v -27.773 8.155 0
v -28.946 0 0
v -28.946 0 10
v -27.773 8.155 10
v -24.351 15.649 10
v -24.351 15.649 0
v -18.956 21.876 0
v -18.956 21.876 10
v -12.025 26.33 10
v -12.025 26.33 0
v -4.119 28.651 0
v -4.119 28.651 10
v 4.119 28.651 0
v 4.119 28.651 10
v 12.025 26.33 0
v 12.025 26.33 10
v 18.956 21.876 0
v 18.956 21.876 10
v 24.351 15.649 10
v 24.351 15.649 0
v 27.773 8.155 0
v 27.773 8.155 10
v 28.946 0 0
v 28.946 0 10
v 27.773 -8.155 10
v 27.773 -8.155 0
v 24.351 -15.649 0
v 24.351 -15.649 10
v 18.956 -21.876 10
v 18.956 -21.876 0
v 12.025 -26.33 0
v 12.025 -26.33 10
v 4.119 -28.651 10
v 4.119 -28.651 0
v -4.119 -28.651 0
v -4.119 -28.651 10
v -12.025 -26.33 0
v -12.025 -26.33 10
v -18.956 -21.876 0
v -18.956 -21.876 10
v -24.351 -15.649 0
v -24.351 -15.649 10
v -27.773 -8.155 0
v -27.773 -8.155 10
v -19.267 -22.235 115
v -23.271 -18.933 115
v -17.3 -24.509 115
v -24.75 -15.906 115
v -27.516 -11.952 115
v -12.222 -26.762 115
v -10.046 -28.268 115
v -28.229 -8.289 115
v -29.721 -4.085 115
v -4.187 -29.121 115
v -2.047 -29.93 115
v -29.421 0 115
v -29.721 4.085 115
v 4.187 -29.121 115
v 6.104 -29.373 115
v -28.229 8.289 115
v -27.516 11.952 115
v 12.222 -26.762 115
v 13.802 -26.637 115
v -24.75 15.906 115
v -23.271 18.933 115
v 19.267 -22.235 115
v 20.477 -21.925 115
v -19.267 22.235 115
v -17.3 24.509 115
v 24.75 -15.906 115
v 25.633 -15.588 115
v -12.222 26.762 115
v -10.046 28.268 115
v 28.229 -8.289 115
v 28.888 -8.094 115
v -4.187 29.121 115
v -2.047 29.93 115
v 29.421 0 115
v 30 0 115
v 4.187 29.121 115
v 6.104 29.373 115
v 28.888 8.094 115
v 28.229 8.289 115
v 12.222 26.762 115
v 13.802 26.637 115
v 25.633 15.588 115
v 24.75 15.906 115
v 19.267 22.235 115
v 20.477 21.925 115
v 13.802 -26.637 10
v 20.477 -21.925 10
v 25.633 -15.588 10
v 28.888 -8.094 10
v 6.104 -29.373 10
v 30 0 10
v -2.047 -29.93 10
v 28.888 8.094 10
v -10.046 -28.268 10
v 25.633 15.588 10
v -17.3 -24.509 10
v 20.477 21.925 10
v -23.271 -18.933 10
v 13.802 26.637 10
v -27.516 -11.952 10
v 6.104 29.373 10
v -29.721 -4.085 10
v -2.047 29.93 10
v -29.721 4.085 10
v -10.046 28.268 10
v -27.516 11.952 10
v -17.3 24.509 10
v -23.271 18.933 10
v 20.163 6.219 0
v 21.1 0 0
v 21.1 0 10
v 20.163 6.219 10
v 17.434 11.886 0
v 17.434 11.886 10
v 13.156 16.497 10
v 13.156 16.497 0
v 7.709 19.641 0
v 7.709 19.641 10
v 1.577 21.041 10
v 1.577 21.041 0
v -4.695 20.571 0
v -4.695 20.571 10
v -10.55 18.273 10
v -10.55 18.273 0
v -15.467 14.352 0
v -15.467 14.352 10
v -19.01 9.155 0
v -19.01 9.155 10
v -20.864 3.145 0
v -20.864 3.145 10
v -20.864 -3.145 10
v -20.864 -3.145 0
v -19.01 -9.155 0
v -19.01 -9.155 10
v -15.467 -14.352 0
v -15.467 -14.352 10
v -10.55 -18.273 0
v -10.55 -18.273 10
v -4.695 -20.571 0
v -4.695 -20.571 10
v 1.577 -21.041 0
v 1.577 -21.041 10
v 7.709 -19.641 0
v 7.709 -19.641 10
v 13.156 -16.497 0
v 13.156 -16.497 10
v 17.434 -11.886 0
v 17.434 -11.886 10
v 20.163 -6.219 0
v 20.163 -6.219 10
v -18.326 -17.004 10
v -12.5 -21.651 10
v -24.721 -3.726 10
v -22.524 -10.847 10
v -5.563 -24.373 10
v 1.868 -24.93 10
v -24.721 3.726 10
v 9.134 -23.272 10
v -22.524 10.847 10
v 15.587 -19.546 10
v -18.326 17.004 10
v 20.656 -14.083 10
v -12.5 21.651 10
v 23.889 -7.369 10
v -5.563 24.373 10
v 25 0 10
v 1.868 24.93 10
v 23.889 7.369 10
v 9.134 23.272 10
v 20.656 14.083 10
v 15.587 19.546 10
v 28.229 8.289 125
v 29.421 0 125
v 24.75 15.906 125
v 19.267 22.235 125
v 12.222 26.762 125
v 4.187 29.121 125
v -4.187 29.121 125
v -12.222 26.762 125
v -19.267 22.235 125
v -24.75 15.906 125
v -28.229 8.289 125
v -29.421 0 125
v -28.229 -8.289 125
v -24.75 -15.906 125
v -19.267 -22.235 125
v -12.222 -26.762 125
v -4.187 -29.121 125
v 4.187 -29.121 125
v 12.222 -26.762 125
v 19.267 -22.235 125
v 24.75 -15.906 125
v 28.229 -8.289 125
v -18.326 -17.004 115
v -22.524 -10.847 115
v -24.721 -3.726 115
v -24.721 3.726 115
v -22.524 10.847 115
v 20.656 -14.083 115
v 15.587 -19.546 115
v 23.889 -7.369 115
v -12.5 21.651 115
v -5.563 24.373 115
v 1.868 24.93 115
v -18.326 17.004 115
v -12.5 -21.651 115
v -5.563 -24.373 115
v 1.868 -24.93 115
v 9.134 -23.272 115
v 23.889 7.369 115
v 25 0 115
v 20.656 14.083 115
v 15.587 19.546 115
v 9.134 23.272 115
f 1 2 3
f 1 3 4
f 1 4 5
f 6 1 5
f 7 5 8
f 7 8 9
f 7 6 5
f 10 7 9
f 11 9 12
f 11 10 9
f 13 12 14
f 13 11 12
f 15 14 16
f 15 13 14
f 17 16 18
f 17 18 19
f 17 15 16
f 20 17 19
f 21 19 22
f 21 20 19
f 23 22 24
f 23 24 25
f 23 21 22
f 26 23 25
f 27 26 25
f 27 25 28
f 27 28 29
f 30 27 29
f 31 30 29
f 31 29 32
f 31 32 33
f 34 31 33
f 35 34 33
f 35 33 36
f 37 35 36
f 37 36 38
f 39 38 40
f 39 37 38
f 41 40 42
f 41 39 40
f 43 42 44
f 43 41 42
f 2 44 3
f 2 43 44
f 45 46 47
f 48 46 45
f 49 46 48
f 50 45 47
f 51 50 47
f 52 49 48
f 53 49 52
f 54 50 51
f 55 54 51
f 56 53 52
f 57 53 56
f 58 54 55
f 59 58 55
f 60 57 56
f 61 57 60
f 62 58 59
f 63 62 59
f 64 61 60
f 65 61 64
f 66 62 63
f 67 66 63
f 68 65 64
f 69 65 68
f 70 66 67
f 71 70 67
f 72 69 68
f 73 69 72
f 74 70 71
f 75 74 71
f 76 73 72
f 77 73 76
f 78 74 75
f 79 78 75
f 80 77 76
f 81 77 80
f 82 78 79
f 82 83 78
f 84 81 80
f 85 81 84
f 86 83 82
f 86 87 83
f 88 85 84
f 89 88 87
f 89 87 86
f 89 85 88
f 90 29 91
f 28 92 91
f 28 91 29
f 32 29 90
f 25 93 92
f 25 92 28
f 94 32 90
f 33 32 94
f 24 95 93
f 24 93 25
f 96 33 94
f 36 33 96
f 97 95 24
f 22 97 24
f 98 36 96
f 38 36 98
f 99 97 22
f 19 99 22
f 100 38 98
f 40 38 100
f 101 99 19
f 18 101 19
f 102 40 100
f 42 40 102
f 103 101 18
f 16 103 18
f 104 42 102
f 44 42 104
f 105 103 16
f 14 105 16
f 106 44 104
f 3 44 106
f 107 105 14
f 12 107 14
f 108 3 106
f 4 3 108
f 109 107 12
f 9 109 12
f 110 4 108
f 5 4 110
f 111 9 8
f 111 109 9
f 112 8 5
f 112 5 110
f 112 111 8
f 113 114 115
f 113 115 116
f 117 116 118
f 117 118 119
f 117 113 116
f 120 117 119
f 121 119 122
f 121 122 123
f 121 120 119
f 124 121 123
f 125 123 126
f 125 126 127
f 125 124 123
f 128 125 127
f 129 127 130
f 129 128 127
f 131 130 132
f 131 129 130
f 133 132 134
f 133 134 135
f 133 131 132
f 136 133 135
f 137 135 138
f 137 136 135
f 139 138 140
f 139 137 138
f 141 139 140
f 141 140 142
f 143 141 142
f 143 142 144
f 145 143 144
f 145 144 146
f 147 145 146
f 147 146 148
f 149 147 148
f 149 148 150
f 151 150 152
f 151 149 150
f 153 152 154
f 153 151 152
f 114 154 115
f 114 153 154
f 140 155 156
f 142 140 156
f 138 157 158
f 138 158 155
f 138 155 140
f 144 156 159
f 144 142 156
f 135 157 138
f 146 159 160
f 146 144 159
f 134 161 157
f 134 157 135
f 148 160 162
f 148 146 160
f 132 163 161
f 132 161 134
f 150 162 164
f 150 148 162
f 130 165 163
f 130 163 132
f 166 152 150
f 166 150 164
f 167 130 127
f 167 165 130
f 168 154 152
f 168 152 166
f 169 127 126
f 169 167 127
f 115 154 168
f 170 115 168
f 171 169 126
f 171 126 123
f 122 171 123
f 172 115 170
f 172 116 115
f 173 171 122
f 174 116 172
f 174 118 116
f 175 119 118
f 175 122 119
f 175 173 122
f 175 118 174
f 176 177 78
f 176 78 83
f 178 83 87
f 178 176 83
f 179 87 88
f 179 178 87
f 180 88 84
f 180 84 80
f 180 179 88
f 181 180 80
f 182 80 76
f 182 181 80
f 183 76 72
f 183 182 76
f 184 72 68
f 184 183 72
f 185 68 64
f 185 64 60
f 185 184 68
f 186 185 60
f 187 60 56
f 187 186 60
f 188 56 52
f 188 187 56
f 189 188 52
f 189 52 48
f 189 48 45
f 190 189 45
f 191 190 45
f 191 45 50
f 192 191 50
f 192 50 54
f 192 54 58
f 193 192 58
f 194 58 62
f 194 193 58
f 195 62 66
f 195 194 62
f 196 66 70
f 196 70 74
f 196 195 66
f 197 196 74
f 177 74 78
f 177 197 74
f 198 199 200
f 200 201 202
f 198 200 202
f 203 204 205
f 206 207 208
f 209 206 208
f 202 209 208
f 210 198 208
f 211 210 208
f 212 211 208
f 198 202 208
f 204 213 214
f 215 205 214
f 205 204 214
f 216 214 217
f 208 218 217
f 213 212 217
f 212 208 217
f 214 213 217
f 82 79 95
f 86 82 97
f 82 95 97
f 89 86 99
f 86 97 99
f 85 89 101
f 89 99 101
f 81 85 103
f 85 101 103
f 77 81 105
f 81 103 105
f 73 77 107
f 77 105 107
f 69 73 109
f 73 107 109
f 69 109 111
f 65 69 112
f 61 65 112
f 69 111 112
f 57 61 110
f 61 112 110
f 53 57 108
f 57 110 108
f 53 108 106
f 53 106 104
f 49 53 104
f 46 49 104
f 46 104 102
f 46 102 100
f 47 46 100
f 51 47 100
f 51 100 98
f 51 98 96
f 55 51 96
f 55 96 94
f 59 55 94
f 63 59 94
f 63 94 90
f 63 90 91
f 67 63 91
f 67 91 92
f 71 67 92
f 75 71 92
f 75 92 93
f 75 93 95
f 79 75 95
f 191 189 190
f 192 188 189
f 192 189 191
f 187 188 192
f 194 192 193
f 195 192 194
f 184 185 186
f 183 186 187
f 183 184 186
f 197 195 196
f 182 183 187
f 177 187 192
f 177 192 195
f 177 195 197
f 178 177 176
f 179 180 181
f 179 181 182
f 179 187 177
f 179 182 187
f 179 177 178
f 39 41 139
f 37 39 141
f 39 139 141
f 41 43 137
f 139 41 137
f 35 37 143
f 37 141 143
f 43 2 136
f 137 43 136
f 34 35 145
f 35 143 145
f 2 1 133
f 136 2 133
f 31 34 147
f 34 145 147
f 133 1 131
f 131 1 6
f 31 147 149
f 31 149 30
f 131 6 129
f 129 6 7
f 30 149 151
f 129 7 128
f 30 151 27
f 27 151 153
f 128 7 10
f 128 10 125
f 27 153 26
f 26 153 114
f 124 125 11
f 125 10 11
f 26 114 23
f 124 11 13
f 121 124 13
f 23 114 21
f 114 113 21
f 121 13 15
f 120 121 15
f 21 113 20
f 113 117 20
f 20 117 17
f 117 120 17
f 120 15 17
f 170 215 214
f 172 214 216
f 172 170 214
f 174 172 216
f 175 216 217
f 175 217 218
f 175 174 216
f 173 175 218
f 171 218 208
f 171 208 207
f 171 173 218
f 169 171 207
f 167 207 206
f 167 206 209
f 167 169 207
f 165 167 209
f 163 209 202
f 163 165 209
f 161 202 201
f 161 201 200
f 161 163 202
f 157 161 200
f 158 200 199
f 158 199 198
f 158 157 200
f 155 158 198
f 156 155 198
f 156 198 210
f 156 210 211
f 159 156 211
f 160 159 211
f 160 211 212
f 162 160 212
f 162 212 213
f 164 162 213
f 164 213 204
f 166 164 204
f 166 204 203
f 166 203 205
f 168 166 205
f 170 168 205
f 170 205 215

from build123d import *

# Parameters (mm, degrees)
SKETCH1_R           = 30
SKETCH1_R_2         = 25
BOSS_EXTRUDE1_DEPTH = 125
SKETCH2_R           = 25
SKETCH2_R_2         = 21.1
BOSS_EXTRUDE2_DEPTH = 10
SKETCH3_R           = 25
BOSS_EXTRUDE3_DEPTH = 10
SKETCH11_R          = 30
SKETCH11_R_2        = 28.945980101
CUT_EXTRUDE2_DEPTH  = 10
SKETCH12_R          = 30
SKETCH12_R_2        = 29.420954363
CUT_EXTRUDE3_DEPTH  = 10


with BuildPart() as part:
    # Sketch1 → Boss-Extrude1 (new body)
    with BuildSketch(Plane.XY):
        Circle(SKETCH1_R)
        Circle(SKETCH1_R_2, mode=Mode.SUBTRACT)
    extrude(amount=BOSS_EXTRUDE1_DEPTH)

    # Sketch2 → Boss-Extrude2 (add)
    with BuildSketch(Plane.XY):
        Circle(SKETCH2_R)
        Circle(SKETCH2_R_2, mode=Mode.SUBTRACT)
    extrude(amount=BOSS_EXTRUDE2_DEPTH)

    # Sketch3 → Boss-Extrude3 (add)
    with BuildSketch(Plane.XY.offset(115)):
        Circle(SKETCH3_R)
    extrude(amount=BOSS_EXTRUDE3_DEPTH)

    # Sketch11 → Cut-Extrude2 (cut)
    with BuildSketch(Plane(origin=(0, 0, 0), x_dir=(-1, 0, 0), z_dir=(0, 0, -1))):
        Circle(SKETCH11_R)
        Circle(SKETCH11_R_2, mode=Mode.SUBTRACT)
    extrude(amount=-CUT_EXTRUDE2_DEPTH, mode=Mode.SUBTRACT)

    # Sketch12 → Cut-Extrude3 (cut)
    with BuildSketch(Plane.XY.offset(125)):
        Circle(SKETCH12_R)
        Circle(SKETCH12_R_2, mode=Mode.SUBTRACT)
    extrude(amount=-CUT_EXTRUDE3_DEPTH, mode=Mode.SUBTRACT)


solid = part.part
